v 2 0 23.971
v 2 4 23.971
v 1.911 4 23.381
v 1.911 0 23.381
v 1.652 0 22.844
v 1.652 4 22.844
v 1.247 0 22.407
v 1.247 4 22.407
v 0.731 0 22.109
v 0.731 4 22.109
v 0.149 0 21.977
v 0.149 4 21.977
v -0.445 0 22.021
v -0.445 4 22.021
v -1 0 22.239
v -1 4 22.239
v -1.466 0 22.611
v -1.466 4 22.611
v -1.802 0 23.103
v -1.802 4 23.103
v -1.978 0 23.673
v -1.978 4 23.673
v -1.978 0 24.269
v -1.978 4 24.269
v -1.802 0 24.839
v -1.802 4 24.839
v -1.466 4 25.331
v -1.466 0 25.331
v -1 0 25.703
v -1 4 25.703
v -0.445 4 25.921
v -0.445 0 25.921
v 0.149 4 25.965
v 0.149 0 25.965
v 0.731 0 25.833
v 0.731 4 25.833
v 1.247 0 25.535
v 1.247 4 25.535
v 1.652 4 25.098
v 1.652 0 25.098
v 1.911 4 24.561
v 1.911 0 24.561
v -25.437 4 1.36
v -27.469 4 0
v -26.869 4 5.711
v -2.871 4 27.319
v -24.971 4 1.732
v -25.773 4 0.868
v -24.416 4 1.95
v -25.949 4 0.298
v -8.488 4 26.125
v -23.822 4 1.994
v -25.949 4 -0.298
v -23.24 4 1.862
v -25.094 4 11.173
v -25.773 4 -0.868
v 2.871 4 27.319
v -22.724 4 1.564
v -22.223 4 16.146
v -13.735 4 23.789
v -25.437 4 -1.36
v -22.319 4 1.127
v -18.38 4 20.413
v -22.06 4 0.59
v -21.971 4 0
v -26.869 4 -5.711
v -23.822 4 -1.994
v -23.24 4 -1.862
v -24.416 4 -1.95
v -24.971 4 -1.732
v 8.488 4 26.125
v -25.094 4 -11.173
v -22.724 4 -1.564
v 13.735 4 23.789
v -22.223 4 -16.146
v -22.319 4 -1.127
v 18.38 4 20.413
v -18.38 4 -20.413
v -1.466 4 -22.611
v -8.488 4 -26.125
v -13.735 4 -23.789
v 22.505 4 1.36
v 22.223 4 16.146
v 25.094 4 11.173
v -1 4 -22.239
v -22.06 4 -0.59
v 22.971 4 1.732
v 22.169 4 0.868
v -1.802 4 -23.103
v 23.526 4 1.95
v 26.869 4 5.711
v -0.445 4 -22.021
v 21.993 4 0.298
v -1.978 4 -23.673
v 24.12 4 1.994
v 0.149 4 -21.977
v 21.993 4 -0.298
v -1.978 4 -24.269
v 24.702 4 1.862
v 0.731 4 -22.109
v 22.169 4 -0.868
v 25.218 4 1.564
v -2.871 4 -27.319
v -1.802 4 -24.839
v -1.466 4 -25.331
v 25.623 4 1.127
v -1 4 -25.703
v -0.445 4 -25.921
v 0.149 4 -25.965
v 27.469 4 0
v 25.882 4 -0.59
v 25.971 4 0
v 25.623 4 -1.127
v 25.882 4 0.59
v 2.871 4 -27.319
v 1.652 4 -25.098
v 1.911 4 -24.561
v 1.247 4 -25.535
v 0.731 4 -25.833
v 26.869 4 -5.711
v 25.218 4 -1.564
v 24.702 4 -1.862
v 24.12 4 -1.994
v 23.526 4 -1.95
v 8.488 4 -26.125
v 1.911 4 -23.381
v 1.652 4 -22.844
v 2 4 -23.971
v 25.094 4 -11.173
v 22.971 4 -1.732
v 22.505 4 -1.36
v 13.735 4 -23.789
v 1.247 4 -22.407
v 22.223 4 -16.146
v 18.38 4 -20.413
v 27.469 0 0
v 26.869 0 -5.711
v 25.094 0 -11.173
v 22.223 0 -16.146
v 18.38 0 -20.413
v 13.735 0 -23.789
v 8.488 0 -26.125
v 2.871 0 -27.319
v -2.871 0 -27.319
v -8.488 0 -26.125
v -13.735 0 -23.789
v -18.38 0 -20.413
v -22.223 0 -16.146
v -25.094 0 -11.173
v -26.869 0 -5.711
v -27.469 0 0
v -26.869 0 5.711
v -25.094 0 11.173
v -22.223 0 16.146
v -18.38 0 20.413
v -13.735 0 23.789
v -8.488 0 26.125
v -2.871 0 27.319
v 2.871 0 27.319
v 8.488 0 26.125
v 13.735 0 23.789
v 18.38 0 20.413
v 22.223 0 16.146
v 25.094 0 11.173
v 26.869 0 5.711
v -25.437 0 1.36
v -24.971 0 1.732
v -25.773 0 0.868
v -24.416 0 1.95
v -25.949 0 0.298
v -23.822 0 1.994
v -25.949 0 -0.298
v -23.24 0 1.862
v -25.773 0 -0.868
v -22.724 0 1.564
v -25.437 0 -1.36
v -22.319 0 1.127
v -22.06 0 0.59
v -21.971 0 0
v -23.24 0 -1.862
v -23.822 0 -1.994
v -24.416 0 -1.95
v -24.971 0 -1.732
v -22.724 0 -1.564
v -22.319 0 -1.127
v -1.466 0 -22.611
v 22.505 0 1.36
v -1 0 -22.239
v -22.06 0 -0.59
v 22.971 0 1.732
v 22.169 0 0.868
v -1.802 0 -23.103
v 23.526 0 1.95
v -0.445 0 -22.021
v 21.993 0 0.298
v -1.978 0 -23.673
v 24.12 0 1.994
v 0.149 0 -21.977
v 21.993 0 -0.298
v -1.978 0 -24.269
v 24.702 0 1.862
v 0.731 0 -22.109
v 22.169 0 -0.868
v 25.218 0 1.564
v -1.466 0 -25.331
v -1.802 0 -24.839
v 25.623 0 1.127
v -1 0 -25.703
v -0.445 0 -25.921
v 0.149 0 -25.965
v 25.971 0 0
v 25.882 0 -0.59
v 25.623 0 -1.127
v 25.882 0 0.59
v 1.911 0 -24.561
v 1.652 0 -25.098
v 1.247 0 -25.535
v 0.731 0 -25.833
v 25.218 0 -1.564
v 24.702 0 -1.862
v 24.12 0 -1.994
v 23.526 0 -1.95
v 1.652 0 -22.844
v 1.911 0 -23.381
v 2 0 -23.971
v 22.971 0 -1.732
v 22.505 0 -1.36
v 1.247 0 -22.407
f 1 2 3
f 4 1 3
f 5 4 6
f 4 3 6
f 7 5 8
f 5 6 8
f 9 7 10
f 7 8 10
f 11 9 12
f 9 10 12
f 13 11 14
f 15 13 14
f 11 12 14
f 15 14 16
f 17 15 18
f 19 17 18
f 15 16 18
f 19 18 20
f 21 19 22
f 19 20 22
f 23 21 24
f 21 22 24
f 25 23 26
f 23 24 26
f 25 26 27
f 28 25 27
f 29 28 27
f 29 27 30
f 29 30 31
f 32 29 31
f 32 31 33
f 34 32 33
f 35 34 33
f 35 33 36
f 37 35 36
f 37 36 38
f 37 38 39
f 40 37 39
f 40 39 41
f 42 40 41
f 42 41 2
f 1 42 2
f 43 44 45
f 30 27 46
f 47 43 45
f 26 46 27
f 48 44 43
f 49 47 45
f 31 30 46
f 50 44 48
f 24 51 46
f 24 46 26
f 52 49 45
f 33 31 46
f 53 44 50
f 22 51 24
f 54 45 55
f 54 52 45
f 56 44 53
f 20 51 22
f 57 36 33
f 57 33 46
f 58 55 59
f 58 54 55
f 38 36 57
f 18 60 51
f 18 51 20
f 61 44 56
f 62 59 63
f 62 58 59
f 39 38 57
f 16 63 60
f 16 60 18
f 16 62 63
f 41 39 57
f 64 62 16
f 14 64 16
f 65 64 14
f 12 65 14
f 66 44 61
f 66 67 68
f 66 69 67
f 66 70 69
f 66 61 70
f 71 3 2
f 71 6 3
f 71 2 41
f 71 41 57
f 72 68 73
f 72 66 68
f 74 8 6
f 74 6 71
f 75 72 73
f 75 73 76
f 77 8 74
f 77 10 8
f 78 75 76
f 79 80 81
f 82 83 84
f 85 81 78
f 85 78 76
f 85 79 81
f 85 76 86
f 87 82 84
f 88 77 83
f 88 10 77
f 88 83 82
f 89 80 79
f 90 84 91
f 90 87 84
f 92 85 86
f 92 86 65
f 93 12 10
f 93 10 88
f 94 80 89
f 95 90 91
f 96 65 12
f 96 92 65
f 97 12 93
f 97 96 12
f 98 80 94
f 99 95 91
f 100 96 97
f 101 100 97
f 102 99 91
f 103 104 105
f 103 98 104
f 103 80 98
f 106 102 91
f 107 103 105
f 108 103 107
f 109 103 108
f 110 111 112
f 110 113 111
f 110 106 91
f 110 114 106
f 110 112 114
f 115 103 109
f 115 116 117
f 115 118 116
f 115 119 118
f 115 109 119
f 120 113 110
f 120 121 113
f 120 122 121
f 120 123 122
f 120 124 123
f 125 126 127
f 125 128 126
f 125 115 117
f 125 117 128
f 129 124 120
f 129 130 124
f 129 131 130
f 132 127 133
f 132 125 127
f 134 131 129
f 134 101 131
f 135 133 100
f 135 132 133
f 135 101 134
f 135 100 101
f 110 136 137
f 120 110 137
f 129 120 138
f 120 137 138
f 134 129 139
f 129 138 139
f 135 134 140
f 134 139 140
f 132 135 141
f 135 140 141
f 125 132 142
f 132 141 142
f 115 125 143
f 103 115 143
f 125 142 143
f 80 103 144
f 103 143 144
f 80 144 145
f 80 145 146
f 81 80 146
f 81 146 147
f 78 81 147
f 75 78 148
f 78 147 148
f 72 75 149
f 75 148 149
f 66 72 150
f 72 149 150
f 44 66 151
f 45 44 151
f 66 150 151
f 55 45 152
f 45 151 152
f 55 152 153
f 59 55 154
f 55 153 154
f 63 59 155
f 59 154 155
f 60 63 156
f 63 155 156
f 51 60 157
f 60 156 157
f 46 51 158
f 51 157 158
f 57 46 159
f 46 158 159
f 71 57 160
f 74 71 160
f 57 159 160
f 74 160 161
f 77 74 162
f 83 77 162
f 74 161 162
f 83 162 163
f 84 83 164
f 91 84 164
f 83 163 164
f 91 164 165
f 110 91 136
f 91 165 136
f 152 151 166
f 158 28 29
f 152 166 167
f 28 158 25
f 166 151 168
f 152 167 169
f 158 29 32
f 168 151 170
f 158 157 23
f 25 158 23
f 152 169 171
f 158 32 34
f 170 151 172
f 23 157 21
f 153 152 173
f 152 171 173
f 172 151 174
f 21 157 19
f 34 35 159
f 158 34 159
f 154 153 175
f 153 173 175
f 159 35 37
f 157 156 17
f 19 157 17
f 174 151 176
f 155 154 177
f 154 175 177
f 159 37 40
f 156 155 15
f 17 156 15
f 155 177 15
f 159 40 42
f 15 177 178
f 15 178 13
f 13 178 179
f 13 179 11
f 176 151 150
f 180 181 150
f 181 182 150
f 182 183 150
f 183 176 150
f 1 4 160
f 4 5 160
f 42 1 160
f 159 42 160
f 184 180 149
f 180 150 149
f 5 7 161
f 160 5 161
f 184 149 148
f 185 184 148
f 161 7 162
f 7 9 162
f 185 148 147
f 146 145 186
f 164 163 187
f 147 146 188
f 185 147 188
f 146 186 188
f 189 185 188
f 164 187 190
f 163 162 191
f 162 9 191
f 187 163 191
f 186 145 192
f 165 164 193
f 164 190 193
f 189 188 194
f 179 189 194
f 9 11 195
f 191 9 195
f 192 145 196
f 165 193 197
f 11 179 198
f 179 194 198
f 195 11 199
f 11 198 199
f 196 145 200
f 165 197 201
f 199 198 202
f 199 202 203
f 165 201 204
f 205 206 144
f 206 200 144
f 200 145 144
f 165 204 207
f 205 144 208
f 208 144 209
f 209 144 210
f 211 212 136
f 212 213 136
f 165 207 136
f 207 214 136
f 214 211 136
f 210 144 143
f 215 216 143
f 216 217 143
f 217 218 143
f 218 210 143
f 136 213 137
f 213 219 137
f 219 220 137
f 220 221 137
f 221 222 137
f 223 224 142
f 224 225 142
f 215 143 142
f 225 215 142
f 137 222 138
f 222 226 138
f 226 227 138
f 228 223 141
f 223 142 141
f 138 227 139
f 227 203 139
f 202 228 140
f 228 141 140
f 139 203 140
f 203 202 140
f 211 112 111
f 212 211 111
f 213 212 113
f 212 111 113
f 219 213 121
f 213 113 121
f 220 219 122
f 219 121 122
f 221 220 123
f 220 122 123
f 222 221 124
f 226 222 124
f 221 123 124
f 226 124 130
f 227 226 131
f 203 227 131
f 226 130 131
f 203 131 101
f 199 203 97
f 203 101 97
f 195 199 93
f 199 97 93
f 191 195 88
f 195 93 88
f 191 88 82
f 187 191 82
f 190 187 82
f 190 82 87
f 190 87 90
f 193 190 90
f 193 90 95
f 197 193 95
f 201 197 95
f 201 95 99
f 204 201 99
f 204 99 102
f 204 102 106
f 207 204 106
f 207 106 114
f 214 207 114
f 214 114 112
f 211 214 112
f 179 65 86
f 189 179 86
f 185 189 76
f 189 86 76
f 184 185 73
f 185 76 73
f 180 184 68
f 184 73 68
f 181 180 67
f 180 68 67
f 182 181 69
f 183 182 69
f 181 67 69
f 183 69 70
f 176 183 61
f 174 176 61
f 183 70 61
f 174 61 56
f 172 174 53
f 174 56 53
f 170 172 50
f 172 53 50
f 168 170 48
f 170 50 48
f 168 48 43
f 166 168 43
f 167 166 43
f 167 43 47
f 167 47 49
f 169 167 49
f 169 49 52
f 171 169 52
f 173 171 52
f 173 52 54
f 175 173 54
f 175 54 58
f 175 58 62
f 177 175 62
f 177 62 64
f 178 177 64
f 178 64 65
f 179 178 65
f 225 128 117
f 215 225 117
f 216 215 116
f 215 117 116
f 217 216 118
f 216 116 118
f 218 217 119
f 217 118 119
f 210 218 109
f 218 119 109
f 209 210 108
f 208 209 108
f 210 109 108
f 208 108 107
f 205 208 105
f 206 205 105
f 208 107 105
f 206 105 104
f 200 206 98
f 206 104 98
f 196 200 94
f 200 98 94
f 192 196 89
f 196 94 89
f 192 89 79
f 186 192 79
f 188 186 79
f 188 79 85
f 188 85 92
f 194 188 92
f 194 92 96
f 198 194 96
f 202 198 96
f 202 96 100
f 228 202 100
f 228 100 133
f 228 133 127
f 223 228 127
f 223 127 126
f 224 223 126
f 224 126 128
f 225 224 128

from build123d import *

# Parameters (mm, degrees)
SKETCH2_R           = 27.469
BOSS_EXTRUDE1_DEPTH = 4
SKETCH3_R           = 2
CUT_EXTRUDE1_DEPTH  = 5


with BuildPart() as part:
    # Sketch2 → Boss-Extrude1 (new body)
    with BuildSketch(Plane(origin=(0, 0, 0), x_dir=(1, 0, 0), z_dir=(0, 1, 0))):
        Circle(SKETCH2_R)
    extrude(amount=BOSS_EXTRUDE1_DEPTH)

    # Sketch3 → Cut-Extrude1 (cut, through all)
    with BuildSketch(Plane(origin=(0, 4, 0), x_dir=(1, 0, 0), z_dir=(0, 1, 0))):
        with Locations((-23.971, 0)):
            Circle(SKETCH3_R)
        with Locations((0, 23.971)):
            Circle(SKETCH3_R)
        with Locations((23.971, 0)):
            Circle(SKETCH3_R)
        with Locations((0, -23.971)):
            Circle(SKETCH3_R)
    extrude(amount=-CUT_EXTRUDE1_DEPTH, mode=Mode.SUBTRACT)


solid = part.part
